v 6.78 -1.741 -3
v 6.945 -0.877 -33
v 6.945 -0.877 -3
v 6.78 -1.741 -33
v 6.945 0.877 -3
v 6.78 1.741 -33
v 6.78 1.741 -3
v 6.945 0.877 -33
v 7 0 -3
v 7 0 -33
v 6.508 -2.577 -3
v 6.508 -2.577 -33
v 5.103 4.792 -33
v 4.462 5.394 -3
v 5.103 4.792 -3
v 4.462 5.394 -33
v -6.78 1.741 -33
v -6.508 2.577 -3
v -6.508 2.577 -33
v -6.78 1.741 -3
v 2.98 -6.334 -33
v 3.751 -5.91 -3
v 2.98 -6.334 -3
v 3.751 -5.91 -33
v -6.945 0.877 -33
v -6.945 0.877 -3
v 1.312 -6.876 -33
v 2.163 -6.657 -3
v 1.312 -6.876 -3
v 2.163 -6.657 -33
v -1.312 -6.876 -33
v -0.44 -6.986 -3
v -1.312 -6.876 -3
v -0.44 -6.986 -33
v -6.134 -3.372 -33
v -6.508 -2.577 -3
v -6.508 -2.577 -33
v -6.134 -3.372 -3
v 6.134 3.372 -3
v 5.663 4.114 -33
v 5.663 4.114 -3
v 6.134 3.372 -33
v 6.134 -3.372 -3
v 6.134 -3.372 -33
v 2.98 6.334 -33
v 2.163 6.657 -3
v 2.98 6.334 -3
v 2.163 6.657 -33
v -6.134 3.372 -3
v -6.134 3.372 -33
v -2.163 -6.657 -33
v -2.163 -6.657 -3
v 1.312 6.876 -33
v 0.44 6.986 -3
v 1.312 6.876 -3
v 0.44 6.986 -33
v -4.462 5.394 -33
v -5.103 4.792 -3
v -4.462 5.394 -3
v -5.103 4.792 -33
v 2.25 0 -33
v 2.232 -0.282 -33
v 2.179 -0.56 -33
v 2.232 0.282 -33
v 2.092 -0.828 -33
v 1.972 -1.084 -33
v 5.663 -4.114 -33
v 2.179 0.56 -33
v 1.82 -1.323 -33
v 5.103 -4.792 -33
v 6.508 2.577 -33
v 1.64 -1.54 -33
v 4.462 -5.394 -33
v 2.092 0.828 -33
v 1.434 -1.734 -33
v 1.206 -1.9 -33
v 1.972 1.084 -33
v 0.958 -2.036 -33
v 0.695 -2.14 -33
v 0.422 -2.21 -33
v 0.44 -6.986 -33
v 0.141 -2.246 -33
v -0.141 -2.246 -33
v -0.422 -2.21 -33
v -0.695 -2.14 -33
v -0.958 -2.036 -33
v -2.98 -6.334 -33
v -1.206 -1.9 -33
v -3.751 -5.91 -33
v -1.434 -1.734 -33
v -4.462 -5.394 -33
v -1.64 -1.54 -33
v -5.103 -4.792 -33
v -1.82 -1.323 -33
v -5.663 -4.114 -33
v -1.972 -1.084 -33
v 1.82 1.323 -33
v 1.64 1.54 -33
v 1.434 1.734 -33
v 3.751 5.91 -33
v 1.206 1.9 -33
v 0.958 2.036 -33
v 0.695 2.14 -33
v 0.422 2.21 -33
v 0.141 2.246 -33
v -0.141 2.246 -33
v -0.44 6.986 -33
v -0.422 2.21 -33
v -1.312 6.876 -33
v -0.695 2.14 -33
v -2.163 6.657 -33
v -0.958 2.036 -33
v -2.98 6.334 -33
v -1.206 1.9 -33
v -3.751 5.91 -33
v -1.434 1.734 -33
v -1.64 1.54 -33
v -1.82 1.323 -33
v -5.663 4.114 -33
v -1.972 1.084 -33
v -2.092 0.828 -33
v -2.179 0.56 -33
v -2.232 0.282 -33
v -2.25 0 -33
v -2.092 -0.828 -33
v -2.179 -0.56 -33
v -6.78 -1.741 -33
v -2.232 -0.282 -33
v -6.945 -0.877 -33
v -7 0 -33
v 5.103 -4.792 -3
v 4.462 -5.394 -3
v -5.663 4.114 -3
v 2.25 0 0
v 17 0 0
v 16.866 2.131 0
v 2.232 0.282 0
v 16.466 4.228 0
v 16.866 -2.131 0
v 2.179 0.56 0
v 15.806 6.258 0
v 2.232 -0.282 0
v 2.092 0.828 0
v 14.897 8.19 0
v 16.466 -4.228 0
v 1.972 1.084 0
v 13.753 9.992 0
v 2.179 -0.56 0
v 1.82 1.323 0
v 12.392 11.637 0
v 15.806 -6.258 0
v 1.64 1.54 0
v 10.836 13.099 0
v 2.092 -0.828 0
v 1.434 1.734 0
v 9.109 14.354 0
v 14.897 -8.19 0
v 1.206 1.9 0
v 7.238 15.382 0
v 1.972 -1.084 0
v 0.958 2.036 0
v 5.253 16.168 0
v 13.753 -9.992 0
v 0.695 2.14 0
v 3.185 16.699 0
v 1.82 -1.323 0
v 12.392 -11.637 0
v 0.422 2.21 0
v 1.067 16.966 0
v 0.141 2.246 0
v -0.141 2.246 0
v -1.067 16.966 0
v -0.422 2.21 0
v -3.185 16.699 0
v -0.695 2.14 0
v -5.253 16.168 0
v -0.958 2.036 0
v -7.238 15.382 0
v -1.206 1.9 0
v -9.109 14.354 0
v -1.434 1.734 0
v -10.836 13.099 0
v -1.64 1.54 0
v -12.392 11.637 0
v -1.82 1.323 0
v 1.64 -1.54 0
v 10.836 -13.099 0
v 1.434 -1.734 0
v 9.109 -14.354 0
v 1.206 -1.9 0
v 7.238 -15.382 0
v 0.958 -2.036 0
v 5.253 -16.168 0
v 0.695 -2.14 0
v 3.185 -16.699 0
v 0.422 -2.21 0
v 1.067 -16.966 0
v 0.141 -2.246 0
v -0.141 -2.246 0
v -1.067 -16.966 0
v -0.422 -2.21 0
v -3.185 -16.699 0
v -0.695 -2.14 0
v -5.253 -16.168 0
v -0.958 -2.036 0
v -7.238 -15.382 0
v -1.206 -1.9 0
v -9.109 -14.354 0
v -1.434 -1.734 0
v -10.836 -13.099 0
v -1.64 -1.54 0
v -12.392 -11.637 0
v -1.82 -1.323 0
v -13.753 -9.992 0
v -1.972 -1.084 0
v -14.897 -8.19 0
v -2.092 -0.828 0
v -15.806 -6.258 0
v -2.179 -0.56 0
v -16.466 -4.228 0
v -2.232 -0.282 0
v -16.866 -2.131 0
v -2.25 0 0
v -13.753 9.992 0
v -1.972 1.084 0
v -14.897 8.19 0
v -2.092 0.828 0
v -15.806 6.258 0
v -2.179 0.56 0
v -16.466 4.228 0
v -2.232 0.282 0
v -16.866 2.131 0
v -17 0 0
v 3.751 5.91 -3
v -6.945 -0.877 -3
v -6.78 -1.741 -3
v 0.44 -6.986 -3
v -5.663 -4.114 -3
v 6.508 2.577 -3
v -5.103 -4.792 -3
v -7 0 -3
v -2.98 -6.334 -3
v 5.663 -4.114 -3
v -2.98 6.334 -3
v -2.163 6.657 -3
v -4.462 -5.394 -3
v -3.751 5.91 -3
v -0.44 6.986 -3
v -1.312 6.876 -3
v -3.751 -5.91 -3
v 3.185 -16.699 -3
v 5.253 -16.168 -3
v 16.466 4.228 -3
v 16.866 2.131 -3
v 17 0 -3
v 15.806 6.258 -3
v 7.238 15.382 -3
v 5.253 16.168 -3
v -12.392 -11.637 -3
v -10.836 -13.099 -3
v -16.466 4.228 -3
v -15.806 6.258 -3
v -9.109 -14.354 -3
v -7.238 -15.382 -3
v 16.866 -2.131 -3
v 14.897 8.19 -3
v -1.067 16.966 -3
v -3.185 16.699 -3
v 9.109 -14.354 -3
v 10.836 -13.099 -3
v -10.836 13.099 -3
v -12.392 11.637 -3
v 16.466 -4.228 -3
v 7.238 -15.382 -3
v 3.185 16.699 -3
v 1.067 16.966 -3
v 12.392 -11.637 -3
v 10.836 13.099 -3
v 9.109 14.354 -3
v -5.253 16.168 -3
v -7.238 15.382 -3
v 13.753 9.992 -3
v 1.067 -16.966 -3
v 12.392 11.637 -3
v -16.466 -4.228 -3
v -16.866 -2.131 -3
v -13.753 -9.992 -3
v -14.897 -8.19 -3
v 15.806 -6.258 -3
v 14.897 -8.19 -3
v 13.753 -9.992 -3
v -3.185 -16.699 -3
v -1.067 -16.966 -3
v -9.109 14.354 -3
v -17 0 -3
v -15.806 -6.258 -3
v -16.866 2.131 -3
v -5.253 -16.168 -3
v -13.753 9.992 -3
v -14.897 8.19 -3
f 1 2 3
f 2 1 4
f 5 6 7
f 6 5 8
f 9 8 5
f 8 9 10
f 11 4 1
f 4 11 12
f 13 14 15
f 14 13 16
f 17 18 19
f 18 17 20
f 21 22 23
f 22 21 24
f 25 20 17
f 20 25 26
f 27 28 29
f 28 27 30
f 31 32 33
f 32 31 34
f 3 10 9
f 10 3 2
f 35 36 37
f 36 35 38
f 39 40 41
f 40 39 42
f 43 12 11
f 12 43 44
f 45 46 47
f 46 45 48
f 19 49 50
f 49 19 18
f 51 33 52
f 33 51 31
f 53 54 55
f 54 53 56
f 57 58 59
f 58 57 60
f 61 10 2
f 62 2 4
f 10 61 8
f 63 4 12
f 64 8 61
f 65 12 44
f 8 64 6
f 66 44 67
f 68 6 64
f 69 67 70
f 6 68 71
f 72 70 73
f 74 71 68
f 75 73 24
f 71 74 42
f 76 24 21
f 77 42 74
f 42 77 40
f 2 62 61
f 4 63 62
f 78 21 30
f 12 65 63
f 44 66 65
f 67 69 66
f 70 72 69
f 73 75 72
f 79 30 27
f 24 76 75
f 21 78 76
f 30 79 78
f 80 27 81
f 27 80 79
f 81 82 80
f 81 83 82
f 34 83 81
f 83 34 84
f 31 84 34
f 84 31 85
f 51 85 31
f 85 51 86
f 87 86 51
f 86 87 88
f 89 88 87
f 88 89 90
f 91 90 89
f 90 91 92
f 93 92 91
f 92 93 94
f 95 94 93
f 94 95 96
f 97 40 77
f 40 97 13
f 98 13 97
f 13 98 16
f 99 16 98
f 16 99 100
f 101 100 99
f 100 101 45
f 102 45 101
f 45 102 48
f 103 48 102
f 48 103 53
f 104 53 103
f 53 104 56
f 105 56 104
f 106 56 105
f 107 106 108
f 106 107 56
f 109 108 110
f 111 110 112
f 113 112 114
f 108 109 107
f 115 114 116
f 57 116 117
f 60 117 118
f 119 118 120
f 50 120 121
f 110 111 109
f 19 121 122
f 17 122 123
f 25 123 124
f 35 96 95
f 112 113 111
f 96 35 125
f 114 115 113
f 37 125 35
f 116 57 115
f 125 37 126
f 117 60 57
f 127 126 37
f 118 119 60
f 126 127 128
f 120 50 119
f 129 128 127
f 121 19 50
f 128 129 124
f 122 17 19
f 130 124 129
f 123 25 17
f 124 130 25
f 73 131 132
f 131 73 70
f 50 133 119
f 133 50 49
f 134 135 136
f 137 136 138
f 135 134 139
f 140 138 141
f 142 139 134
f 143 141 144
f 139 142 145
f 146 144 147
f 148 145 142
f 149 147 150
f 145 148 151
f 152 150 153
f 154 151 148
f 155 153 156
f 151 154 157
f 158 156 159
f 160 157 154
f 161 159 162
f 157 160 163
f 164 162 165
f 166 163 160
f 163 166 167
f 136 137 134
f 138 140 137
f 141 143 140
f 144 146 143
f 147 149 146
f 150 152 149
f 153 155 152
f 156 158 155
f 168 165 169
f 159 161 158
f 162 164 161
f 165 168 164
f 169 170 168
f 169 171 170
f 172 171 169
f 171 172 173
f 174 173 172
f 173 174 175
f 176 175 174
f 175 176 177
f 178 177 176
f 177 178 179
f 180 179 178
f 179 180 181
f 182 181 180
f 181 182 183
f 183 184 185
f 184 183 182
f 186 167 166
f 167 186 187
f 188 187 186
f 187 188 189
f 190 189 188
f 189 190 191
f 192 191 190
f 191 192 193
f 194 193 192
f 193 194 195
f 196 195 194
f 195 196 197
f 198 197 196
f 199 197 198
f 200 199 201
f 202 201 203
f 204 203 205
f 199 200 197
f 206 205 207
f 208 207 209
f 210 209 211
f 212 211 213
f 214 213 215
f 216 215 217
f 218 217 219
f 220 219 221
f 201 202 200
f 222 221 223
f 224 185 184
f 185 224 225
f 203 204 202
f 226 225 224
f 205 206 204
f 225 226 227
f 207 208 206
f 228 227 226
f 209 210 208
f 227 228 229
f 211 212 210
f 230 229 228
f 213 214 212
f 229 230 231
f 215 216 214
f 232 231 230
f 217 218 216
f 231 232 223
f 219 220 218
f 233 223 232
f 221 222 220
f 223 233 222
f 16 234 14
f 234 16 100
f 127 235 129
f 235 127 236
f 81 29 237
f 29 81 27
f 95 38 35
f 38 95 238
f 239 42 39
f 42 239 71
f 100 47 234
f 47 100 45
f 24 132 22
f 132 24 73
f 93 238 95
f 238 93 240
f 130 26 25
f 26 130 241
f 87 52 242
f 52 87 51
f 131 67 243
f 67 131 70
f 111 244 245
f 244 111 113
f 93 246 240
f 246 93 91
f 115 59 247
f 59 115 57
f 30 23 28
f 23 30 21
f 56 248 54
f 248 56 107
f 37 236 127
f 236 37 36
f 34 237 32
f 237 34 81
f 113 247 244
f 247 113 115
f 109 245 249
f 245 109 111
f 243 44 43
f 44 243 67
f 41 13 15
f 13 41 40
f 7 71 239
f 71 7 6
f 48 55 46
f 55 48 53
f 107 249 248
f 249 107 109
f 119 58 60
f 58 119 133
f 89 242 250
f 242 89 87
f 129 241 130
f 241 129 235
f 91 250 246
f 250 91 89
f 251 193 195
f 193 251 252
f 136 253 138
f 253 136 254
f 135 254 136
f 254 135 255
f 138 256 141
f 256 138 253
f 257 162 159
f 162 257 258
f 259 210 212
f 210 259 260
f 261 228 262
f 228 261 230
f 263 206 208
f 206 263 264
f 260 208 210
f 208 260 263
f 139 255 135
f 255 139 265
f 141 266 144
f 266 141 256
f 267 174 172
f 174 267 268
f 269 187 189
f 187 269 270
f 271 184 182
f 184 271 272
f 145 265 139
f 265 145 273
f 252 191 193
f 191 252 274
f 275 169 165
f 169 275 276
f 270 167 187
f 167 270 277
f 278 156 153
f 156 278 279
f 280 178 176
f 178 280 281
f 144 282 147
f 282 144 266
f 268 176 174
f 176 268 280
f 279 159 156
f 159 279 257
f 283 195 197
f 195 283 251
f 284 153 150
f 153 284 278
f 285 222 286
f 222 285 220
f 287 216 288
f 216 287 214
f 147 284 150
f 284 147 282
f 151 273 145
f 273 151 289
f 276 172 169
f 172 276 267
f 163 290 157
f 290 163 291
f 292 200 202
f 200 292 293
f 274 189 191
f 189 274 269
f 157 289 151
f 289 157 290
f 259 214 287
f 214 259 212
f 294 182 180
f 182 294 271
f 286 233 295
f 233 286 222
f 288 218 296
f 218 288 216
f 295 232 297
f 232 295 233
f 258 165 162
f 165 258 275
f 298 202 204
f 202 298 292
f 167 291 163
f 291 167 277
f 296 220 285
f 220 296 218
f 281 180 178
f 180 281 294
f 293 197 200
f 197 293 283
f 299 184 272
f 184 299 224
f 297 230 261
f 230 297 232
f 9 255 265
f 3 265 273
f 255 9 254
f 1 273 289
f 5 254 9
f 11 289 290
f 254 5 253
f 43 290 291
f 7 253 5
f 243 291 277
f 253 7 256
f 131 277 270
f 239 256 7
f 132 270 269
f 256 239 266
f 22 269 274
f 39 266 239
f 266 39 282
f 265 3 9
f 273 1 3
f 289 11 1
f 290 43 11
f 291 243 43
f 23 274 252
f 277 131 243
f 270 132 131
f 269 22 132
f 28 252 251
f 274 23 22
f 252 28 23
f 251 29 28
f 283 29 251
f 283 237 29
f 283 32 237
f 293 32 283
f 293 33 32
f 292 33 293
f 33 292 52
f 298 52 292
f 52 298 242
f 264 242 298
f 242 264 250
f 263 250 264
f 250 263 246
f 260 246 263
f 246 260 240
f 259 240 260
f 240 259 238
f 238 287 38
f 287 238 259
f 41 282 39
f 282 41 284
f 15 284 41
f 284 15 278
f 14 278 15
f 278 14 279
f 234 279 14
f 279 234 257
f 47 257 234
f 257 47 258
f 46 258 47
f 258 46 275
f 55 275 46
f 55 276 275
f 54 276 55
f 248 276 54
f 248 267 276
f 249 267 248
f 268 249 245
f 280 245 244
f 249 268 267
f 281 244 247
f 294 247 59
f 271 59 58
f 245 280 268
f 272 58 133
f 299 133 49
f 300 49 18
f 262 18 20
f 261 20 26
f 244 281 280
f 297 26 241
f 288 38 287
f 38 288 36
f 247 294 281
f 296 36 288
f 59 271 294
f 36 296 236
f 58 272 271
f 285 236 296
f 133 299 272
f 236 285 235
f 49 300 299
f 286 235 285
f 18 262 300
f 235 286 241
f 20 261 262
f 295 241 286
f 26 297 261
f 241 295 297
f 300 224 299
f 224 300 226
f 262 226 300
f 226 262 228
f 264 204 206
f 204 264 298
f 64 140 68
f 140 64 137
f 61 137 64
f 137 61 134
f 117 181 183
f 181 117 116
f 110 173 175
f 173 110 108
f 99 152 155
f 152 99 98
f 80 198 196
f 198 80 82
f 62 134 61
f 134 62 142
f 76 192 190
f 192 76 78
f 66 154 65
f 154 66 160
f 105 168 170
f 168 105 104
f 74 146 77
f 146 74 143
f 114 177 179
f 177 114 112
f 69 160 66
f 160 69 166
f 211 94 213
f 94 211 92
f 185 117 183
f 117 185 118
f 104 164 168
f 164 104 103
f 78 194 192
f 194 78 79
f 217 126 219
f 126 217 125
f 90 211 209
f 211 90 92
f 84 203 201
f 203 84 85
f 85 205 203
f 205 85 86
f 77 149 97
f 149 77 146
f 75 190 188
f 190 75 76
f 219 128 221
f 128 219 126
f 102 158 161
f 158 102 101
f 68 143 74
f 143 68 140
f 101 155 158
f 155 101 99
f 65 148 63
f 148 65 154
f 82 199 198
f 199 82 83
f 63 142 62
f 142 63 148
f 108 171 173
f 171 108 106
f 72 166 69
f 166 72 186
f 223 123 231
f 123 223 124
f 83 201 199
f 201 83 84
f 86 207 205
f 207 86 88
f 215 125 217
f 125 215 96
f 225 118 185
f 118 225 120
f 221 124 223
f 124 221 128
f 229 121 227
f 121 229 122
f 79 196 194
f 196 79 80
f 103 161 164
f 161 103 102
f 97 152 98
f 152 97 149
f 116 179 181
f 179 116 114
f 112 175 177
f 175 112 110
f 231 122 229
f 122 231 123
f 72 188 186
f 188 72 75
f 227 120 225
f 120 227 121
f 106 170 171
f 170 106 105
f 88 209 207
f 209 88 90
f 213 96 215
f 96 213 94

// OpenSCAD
$fn = 50;


difference() {
	union() {
		translate(v = [0, 0, -33.0000000000]) {
			cylinder(h = 33, r = 7.0000000000);
		}
		translate(v = [0, 0, -3.0000000000]) {
			cylinder(h = 3, r = 17.0000000000);
		}
	}
	union() {
		#translate(v = [0, 0, -33]) {
			cylinder(h = 33, r = 2.2500000000);
		}
	}
}
